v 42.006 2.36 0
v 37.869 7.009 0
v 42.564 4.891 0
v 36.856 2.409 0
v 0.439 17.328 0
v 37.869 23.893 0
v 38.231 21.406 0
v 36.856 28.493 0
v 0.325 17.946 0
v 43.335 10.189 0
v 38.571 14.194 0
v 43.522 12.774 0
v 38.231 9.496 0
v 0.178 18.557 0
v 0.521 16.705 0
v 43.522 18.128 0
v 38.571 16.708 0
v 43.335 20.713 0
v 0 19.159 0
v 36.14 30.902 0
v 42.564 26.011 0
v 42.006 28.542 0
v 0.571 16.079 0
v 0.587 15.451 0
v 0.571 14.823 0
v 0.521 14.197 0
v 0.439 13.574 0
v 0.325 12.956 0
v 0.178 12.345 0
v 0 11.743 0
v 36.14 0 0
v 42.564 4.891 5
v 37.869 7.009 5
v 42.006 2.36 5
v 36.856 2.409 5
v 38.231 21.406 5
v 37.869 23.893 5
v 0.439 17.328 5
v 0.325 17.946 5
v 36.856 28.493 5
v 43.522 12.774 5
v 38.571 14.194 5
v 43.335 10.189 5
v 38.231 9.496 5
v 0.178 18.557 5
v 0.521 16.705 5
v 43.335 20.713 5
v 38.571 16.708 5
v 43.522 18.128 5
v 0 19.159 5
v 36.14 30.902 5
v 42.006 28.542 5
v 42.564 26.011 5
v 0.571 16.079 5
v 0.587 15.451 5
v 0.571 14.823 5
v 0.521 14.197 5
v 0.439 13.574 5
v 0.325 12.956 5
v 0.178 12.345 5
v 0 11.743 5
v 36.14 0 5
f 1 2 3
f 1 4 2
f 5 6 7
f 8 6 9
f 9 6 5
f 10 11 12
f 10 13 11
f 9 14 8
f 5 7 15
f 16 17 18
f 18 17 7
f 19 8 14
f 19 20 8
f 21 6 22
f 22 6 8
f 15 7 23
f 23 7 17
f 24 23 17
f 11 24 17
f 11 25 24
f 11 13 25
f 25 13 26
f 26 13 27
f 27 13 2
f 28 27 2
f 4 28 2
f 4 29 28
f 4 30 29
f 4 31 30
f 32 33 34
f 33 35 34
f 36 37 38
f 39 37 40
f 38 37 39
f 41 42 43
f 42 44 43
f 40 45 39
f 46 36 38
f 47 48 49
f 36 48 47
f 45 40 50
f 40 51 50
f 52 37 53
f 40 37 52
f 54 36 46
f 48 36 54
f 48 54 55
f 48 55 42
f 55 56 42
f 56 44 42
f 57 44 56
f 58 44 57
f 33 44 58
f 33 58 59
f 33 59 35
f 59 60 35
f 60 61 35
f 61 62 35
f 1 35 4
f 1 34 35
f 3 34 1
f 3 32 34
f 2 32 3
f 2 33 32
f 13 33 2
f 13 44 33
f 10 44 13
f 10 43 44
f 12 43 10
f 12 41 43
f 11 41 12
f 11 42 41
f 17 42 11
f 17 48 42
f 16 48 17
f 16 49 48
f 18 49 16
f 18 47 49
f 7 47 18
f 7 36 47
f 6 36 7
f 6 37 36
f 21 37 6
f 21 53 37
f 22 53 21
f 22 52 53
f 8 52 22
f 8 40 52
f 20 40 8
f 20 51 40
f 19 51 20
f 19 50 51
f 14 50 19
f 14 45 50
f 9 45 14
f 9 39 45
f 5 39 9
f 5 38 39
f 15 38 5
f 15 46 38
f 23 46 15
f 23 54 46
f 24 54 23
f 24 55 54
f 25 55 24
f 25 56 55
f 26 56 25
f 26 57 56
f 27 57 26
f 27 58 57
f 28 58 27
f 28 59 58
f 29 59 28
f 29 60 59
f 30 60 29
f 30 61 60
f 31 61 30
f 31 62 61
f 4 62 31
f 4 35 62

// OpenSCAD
$fn = 32;

// ----------------------------------------------------------------------
// Gear sector: 4 teeth on 36 degrees
// ----------------------------------------------------------------------

// --- parameters (mm) ---
sector_angle = 36;        // sector angle, degrees
root_r = 50;              // root circle radius
tooth_h = 5;              // tooth height over the root circle
teeth = 4;                // number of teeth on the sector
hub_r = 12;               // hub bore radius
plate_t = 5;              // sector thickness, Z
arc_step = 3;             // sampling step of the root/hub arcs, degrees

tip_r = root_r + tooth_h;  // tip circle radius

profile = [[36.14, 0], [36.856, 2.409], [42.006, 2.36], [42.564, 4.891], [37.869, 7.009], [38.231, 9.496], [43.335, 10.189], [43.522, 12.774], [38.571, 14.194], [38.571, 16.708], [43.522, 18.128], [43.335, 20.713], [38.231, 21.406], [37.869, 23.893], [42.564, 26.011], [42.006, 28.542], [36.856, 28.493], [36.14, 30.902], [0, 19.159], [0.178, 18.557], [0.325, 17.946], [0.439, 17.328], [0.521, 16.705], [0.571, 16.079], [0.587, 15.451], [0.571, 14.823], [0.521, 14.197], [0.439, 13.574], [0.325, 12.956], [0.178, 12.345], [0, 11.743]];  // primary outline, 31 points, counter clockwise

// --- the one profile operation ---
linear_extrude(height = plate_t) polygon(points = profile);
